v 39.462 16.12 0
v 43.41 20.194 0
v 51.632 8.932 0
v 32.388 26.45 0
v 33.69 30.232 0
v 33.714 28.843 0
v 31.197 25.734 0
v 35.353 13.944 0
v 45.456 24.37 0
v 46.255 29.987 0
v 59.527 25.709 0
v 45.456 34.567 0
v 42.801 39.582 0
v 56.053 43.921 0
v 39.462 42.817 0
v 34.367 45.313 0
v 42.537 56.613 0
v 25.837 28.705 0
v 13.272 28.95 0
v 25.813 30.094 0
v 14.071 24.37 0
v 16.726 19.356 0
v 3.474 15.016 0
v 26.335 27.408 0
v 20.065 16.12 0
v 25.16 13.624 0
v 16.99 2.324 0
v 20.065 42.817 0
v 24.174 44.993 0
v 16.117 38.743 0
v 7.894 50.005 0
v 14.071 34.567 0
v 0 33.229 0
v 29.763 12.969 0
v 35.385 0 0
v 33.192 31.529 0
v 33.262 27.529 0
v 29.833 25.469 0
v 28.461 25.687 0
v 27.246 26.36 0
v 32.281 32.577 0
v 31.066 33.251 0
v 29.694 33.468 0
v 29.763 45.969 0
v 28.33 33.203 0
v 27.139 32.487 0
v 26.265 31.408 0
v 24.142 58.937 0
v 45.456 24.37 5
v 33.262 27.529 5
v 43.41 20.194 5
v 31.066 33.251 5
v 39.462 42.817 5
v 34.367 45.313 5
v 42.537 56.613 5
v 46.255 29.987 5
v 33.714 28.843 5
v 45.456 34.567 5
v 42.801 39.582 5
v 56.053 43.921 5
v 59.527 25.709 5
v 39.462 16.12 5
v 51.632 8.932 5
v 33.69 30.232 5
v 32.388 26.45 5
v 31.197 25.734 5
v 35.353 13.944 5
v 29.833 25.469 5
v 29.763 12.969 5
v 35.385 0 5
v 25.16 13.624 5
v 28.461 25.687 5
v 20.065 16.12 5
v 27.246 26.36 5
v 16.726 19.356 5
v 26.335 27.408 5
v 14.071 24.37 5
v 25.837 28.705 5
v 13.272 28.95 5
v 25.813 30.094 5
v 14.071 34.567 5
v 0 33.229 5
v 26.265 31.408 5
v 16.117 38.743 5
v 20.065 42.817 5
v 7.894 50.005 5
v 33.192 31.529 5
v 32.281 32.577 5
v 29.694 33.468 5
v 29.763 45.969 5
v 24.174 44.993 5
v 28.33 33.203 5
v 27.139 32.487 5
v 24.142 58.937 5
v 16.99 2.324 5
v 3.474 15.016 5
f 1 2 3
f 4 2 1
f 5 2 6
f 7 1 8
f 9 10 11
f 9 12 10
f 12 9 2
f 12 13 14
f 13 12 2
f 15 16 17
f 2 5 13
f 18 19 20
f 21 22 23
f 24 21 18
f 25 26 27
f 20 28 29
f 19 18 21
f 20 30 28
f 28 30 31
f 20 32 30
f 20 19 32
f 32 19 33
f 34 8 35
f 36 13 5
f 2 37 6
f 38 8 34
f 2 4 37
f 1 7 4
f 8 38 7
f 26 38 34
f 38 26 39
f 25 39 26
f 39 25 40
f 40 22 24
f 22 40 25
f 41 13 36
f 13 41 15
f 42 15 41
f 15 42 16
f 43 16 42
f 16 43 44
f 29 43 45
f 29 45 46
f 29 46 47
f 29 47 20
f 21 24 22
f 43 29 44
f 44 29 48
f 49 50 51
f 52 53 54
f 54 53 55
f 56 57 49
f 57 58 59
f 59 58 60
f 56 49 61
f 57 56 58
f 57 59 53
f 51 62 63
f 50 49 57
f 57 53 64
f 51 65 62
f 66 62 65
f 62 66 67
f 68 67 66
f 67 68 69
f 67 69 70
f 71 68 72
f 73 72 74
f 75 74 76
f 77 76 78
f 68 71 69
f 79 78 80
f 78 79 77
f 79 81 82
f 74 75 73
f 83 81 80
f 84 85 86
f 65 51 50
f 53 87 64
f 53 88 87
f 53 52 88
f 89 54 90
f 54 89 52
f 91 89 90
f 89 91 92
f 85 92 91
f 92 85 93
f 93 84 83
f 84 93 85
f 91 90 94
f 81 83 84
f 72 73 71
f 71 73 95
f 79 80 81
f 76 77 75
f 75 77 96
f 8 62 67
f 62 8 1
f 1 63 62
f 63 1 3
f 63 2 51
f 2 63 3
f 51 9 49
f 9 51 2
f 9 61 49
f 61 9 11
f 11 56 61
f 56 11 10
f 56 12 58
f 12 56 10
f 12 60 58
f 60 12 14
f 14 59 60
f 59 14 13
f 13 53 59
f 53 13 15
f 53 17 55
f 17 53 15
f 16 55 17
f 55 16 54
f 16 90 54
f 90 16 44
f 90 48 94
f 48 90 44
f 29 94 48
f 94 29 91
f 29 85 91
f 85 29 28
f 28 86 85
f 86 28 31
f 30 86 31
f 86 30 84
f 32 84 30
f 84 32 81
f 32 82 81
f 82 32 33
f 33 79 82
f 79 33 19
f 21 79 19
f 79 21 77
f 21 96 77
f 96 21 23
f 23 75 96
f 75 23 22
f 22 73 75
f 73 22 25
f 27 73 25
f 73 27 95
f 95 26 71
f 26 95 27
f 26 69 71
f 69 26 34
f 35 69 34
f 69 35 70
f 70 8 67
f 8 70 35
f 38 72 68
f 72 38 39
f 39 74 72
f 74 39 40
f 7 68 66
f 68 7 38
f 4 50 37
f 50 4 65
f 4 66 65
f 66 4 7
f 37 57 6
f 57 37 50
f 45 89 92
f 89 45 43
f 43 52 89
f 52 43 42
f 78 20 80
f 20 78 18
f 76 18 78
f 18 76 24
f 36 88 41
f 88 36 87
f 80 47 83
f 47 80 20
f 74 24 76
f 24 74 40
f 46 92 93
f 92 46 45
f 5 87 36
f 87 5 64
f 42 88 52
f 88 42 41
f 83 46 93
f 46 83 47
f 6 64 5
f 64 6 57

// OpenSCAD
$fn = 32;

// ----------------------------------------------------------------------
// Star wheel: 10-point ratchet, R30
// ----------------------------------------------------------------------

// --- parameters (mm) ---
n_points = 10;            // number of points / teeth
r_out = 30;               // tip radius
r_in = 16.5;              // root radius
bore_r = 4;               // centre bore radius
plate_t = 5;              // plate thickness, Z (extrusion height)
bore_d = 8;               // centre bore diameter
fit_tol = 0.1;            // declared fit tolerance (prompt contract)
free_tol = 0.3;           // declared free tolerance (prompt contract)

profile = [[29.763, 45.969], [24.142, 58.937], [24.174, 44.993], [20.065, 42.817], [7.894, 50.005], [16.117, 38.743], [14.071, 34.567], [0, 33.229], [13.272, 28.95], [14.071, 24.37], [3.474, 15.016], [16.726, 19.356], [20.065, 16.12], [16.99, 2.324], [25.16, 13.624], [29.763, 12.969], [35.385, 0], [35.353, 13.944], [39.462, 16.12], [51.632, 8.932], [43.41, 20.194], [45.456, 24.37], [59.527, 25.709], [46.255, 29.987], [45.456, 34.567], [56.053, 43.921], [42.801, 39.582], [39.462, 42.817], [42.537, 56.613], [34.367, 45.313]];  // primary outline, 30 points, counter clockwise
void_1 = [[33.69, 30.232], [33.192, 31.529], [32.281, 32.577], [31.066, 33.251], [29.694, 33.468], [28.33, 33.203], [27.139, 32.487], [26.265, 31.408], [25.813, 30.094], [25.837, 28.705], [26.335, 27.408], [27.246, 26.36], [28.461, 25.687], [29.833, 25.469], [31.197, 25.734], [32.388, 26.45], [33.262, 27.529], [33.714, 28.843]];  // centre bore, 18 points

// --- the one profile operation ---
difference() {
  linear_extrude(height = plate_t) polygon(points = profile);
  translate([0, 0, -1])
    linear_extrude(height = plate_t + 2) polygon(points = void_1);
}
